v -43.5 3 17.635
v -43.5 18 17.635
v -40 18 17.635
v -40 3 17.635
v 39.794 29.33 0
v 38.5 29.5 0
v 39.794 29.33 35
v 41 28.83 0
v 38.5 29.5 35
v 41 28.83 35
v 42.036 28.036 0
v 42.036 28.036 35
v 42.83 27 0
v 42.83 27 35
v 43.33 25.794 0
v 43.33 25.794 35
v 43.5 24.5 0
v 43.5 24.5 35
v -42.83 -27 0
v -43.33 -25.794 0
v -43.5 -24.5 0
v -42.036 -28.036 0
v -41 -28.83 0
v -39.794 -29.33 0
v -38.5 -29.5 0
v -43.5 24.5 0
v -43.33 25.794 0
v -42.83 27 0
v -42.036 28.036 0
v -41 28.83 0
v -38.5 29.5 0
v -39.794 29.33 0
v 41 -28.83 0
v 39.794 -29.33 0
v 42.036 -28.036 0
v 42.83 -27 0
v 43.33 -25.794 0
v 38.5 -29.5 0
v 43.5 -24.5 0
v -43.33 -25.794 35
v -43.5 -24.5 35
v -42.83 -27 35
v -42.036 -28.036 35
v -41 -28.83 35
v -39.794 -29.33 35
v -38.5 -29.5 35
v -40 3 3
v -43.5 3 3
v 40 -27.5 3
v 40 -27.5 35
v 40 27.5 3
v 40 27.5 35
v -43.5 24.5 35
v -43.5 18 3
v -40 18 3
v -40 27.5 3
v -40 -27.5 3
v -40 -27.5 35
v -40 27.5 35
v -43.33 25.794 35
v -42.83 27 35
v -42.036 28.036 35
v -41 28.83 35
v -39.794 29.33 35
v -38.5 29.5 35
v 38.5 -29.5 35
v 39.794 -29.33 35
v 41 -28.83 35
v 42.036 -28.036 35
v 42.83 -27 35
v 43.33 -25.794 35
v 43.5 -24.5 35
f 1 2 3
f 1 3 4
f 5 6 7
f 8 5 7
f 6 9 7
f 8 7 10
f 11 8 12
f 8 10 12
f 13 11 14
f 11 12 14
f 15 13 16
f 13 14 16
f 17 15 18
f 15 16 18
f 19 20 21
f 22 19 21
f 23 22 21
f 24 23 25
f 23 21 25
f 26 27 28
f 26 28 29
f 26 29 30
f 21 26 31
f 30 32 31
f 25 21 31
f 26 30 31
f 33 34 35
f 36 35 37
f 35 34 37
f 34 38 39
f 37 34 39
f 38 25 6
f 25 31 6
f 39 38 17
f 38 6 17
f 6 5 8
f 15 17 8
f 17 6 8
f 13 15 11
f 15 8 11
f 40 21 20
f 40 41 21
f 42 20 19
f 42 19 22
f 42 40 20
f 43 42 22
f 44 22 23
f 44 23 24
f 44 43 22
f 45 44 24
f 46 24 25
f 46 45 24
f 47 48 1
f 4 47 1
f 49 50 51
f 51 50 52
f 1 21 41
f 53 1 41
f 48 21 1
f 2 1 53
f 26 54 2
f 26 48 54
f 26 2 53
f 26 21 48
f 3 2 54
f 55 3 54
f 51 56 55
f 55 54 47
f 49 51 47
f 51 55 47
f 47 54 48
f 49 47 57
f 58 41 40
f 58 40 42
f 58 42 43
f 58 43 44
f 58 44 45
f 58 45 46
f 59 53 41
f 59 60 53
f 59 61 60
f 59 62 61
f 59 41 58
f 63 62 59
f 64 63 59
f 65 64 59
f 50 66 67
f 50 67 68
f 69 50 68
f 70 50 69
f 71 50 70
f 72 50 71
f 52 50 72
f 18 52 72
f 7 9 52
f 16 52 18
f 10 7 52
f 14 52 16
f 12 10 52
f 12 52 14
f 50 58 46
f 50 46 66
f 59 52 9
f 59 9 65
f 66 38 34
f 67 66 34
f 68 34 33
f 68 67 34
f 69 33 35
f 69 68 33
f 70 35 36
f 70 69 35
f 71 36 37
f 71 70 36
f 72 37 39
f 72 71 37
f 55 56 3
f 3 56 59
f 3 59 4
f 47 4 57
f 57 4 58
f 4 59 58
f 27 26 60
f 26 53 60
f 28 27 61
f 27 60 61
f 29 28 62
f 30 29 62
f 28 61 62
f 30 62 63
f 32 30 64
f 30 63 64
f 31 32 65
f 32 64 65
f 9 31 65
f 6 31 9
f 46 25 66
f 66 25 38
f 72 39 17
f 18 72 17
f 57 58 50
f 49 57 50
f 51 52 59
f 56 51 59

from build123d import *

# Parameters (mm, degrees)
F0_W     = 87
F0_H     = 59
F1_DEPTH = 35
F2_W     = 40
F2_H     = 27.5
F3_DEPTH = 32
F4_R     = 5
F5_W     = 15
F5_H     = 12.435101904
F5_H_2   = 2.1998170093
F6_DEPTH = 25


with BuildPart() as f1:
    # F0 (on Top) → F1 (new body)
    with BuildSketch(Plane.XY):
        Rectangle(F0_W, F0_H)
    extrude(amount=F1_DEPTH)

    # F2 (on face) → F3 (cut)
    with BuildSketch(Plane.XY.offset(35)):
        with Locations((-20, -13.75)):
            Rectangle(F2_W, F2_H)
        with Locations((20, 13.75)):
            Rectangle(F2_W, F2_H)
        with Locations((20, -13.75)):
            Rectangle(F2_W, F2_H)
        with Locations((-20, 13.75)):
            Rectangle(F2_W, F2_H)
    extrude(amount=-F3_DEPTH, mode=Mode.SUBTRACT)

    # F4
    f4_edges = [f1.edges().sort_by_distance(p)[0] for p in [
        (-43.5, -29.5, 17.5),
        (43.5, -29.5, 17.5),
        (43.5, 29.5, 17.5),
        (-43.5, 29.5, 17.5),
    ]]
    fillet(f4_edges, radius=F4_R)

    # F5 (on face) → F6 (cut)
    with BuildSketch(Plane(origin=(-43.5, 0, 0), x_dir=(0, -1, 0), z_dir=(-1, 0, 0))):
        with Locations((-10.5, 11.4173679613)):
            Rectangle(F5_W, F5_H)
        with Locations((-10.5, 4.0999085046)):
            Rectangle(F5_W, F5_H_2)
    extrude(amount=-F6_DEPTH, mode=Mode.SUBTRACT)


solid = f1.part
